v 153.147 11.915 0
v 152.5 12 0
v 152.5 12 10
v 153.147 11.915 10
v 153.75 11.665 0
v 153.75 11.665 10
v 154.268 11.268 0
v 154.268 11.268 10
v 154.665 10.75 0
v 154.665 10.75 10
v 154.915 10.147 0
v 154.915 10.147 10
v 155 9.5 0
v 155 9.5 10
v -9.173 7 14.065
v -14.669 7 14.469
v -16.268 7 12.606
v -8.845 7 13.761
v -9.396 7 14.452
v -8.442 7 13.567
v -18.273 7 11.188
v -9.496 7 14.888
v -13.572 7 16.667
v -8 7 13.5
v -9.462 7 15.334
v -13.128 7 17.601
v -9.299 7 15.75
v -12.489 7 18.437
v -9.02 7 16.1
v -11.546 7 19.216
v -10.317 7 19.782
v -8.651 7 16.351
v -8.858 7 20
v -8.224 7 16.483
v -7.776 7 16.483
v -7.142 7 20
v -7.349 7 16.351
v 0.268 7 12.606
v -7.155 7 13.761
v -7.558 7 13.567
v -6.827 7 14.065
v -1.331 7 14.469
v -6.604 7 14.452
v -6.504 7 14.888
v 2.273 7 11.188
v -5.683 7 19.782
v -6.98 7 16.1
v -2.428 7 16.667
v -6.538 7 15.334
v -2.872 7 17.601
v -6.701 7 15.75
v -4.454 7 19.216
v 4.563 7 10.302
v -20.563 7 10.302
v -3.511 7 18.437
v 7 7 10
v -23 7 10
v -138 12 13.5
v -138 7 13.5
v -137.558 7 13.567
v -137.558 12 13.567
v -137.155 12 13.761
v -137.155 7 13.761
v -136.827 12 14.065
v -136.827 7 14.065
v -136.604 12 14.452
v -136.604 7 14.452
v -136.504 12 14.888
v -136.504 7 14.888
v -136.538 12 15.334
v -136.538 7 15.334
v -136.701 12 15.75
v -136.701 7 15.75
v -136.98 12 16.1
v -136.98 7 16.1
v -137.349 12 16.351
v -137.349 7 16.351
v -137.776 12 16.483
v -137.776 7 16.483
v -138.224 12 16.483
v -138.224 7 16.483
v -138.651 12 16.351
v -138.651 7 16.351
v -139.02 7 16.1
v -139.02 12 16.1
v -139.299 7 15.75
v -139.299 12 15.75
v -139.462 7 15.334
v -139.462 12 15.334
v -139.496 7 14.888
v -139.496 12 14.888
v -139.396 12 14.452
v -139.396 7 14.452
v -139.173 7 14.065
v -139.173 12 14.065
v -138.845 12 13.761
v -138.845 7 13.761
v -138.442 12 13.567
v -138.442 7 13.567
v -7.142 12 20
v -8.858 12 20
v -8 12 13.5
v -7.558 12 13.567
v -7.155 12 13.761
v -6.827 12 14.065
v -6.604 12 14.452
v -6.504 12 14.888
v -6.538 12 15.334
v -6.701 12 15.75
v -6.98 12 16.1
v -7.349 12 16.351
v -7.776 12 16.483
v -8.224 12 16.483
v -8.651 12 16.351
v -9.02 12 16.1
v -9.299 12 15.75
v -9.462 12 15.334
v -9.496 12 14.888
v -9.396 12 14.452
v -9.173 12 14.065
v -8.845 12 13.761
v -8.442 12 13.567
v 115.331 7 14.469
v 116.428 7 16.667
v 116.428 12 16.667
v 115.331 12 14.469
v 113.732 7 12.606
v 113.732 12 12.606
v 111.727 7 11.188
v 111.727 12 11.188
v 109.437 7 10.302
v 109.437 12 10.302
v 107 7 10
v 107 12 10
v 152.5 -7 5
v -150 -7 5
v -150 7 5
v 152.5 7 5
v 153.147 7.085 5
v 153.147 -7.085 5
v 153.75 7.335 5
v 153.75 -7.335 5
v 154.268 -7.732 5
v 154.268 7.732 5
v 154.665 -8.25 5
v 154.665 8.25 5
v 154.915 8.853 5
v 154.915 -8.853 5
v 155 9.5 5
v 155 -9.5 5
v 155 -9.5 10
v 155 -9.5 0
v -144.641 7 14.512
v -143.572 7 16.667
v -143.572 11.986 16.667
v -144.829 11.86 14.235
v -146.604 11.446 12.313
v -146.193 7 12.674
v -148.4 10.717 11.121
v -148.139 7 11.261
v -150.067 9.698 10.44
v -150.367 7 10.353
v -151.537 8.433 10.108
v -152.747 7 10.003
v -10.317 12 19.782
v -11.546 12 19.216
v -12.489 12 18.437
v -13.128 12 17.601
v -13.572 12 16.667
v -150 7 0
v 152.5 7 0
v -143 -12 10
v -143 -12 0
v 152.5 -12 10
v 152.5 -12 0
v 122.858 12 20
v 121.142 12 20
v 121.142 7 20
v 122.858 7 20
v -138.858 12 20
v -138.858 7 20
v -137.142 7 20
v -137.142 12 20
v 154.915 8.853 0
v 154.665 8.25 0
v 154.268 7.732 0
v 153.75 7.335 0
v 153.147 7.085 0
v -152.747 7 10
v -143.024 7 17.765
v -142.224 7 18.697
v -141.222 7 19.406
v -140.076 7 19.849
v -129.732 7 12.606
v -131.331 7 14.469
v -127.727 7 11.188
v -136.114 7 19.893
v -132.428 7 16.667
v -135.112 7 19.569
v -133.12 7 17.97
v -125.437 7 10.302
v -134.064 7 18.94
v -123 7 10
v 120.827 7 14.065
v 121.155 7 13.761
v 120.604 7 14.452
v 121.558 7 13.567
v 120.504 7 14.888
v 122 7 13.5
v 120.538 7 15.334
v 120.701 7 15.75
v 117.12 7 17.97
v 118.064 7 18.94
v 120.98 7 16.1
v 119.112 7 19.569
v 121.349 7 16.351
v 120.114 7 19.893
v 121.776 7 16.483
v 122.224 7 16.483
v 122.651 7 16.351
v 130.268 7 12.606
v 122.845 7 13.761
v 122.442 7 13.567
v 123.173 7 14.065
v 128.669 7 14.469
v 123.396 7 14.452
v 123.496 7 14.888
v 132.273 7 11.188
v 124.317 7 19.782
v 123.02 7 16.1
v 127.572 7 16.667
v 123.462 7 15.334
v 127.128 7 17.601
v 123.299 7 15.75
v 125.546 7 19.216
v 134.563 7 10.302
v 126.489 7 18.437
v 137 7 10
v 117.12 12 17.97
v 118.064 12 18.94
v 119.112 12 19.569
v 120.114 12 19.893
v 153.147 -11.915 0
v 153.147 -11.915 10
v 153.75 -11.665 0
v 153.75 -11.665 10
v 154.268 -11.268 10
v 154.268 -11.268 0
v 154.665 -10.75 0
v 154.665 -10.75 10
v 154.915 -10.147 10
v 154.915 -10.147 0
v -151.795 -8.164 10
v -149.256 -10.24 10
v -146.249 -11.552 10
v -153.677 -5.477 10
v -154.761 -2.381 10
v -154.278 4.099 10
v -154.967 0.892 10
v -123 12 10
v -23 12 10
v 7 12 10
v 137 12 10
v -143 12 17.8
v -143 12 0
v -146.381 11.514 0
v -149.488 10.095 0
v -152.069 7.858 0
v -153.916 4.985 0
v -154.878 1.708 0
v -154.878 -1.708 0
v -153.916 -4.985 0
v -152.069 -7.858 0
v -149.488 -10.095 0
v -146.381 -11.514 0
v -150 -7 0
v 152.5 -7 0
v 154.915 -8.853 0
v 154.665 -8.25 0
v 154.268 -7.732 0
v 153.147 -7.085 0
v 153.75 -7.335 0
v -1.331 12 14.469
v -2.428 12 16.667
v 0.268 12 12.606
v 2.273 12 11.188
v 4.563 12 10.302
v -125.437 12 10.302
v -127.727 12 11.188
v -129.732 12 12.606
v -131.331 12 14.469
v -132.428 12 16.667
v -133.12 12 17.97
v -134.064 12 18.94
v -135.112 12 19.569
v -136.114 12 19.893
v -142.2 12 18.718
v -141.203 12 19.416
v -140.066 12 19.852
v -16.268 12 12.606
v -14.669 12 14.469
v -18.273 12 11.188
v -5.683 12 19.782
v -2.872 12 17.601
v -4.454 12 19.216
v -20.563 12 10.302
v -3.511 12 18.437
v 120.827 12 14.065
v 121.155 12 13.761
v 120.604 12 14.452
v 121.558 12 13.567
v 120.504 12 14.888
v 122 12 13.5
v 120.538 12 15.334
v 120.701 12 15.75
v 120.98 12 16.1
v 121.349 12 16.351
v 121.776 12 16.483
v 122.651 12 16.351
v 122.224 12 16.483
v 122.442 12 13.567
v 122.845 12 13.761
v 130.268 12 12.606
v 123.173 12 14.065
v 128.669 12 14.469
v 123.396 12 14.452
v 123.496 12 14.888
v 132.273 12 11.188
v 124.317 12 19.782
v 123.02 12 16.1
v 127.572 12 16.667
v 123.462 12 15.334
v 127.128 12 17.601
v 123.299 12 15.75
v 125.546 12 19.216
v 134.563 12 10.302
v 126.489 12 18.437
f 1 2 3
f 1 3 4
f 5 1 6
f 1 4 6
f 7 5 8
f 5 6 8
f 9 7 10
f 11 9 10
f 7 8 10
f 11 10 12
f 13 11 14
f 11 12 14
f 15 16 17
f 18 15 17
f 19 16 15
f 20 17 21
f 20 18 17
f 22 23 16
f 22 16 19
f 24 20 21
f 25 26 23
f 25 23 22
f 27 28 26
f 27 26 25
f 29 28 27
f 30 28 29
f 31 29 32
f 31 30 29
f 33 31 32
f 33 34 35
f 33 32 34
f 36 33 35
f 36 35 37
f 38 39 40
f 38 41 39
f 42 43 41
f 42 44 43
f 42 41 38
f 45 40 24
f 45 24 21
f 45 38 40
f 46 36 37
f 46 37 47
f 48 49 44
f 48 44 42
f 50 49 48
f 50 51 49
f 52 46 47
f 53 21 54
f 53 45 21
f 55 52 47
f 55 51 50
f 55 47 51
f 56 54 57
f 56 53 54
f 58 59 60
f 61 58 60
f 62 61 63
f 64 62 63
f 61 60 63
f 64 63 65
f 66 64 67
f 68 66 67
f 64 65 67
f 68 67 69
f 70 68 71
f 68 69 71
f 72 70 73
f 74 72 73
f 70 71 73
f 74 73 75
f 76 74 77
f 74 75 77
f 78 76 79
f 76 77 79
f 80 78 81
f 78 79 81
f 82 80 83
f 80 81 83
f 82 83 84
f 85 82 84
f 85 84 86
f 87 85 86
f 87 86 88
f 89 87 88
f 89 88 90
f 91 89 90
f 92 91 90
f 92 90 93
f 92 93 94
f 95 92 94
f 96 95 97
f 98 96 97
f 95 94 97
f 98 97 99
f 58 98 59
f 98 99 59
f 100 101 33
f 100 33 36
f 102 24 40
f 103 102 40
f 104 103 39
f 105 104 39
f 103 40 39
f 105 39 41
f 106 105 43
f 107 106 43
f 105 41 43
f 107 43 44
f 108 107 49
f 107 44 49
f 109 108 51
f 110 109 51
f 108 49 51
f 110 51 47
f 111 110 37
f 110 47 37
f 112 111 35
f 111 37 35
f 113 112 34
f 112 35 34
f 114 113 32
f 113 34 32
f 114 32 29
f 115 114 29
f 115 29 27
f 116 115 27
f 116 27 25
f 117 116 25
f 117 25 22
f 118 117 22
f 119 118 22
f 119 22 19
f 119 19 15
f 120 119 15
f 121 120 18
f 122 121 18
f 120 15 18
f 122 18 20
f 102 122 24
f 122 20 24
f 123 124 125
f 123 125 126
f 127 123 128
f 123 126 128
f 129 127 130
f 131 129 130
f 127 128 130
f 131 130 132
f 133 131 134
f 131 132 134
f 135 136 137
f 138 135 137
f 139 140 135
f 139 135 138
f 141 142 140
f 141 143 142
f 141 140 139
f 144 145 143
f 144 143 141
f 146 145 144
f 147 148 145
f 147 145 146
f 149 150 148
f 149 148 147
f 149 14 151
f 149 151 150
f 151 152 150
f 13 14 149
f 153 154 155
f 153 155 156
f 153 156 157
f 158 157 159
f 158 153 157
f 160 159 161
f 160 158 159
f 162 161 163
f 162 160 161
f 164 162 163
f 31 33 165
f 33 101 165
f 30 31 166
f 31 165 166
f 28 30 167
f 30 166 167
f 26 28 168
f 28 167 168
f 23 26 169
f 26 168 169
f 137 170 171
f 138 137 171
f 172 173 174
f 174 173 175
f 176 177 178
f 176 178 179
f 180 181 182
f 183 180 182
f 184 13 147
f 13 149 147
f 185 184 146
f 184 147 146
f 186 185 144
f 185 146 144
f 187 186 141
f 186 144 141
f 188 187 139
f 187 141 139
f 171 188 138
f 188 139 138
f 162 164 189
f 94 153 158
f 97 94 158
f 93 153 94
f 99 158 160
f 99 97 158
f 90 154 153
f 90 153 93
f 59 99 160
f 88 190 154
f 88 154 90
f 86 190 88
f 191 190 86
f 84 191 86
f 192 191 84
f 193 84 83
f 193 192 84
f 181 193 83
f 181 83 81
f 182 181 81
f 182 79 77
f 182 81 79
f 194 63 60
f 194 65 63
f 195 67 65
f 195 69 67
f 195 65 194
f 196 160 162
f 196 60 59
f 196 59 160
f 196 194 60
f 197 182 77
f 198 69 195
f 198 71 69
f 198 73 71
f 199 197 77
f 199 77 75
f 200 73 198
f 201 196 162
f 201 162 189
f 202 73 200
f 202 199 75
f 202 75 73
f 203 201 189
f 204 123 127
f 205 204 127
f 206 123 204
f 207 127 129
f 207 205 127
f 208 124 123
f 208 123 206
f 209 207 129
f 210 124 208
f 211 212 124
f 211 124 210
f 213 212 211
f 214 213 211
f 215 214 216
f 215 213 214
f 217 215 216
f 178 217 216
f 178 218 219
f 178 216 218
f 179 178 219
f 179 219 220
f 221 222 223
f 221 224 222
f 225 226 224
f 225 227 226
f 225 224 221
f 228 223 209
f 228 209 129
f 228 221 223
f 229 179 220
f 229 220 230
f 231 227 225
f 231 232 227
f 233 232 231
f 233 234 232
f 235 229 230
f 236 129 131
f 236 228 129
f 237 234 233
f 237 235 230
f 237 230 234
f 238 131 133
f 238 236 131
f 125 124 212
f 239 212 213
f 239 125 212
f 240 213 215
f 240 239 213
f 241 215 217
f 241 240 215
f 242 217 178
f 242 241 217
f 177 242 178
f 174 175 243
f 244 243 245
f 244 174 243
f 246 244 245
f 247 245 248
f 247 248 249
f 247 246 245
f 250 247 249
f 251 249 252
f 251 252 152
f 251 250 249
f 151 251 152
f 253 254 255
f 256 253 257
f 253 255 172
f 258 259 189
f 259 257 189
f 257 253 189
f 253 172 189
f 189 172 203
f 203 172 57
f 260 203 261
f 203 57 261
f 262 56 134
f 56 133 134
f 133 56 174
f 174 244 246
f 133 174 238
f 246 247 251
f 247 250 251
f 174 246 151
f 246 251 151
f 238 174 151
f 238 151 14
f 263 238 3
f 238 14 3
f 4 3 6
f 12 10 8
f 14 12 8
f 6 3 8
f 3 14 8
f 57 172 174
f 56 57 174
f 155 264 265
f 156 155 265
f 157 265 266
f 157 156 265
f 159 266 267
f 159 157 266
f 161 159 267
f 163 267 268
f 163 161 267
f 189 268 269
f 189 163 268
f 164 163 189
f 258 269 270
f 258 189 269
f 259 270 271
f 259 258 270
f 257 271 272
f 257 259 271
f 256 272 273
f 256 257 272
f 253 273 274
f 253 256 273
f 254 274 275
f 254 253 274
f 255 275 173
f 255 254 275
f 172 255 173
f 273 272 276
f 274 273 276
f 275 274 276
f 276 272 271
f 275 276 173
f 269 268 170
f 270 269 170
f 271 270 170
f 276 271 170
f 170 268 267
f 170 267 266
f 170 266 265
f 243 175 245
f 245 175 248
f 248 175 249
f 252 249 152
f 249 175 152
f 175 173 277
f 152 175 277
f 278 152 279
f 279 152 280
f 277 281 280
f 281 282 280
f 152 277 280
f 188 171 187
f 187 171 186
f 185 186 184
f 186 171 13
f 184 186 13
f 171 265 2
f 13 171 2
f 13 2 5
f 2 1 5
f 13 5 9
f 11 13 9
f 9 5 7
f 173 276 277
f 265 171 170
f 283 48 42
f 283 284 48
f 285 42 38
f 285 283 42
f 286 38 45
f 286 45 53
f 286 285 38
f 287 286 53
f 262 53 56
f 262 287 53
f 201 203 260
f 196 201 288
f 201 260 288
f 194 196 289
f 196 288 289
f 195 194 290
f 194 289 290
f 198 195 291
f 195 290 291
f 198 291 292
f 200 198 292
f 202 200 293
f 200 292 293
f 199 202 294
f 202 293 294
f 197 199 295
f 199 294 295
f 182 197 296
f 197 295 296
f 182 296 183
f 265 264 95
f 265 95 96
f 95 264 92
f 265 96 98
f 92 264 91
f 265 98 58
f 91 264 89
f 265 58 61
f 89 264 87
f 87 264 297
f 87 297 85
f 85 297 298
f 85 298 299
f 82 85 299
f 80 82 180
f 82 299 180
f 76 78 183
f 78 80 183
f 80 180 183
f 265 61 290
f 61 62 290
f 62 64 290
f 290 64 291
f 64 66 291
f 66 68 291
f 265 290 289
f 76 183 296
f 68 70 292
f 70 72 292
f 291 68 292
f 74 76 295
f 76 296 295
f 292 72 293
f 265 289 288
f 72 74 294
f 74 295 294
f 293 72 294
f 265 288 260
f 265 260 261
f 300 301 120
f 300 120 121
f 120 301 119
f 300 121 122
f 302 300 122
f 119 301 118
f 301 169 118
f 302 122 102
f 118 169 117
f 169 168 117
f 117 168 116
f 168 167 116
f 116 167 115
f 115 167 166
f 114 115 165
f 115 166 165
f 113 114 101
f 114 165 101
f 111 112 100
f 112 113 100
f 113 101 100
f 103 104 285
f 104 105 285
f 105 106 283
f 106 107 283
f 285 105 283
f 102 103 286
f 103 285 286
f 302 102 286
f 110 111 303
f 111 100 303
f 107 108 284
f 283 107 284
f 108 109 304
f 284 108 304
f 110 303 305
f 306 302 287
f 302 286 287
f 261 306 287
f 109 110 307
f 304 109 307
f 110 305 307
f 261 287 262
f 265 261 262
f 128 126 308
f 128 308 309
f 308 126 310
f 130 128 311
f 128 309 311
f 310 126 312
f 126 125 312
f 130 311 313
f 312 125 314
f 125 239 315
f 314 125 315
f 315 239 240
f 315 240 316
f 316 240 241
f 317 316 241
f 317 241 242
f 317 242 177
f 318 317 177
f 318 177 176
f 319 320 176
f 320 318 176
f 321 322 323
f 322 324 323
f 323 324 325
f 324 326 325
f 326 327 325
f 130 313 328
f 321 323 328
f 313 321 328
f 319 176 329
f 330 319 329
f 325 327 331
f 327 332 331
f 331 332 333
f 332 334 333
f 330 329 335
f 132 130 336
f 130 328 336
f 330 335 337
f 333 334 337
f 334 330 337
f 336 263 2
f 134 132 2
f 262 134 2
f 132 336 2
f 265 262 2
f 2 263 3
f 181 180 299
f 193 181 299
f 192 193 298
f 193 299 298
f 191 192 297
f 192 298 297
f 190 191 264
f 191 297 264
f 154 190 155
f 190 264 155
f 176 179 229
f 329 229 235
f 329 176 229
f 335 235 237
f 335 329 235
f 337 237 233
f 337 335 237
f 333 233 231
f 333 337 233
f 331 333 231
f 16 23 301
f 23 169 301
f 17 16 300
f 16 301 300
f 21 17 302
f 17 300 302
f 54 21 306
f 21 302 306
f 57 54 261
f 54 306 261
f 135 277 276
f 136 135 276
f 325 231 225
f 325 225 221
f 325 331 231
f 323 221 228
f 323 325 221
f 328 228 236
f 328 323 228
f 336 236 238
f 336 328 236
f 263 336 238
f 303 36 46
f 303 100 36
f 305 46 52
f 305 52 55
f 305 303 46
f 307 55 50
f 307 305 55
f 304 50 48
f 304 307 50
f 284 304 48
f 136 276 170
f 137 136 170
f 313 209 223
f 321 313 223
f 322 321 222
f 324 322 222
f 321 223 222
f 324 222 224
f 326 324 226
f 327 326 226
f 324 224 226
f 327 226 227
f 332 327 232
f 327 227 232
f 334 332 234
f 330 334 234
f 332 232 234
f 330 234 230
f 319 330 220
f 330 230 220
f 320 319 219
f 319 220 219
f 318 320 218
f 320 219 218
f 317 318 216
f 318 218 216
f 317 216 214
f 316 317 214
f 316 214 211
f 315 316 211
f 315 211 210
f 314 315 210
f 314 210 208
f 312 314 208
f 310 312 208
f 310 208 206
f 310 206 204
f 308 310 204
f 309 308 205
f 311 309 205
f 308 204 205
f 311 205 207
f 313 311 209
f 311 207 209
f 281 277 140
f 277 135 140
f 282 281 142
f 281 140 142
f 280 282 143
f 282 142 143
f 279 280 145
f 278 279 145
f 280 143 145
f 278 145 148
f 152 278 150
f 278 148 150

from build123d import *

# Parameters (mm, degrees)
BOSS_EXTRU_1_DEPTH = 10
BOSS_EXTRU_2_REACH = 312.393
ESQUISSE2_W        = 5
ESQUISSE2_H        = 24
CONG_1_RADIUS      = 12
CONG_1_LENGTH      = 10
BOSS_EXTRU_3_START = -19
ESQUISSE3_W        = 10
ESQUISSE3_H        = 10
ESQUISSE3_R        = 1.5
BOSS_EXTRU_3_DEPTH = 5
CONG_2_R           = 10
CONG_3_R           = 10
CONG_4_R           = 2.5
CONG_5_R           = 2.5
CONG_6_R           = 5


# Some blends are built 0.0001 mm under size
with BuildPart() as part:
    # Esquisse1 → Boss.-Extru.1 (new body)
    with BuildSketch(Plane.XY):
        Polygon((-150, 7), (-155, 7), (-155, -12), (155, -12), (155, -7), (150, -7), (-150, -7), align=None)
        Polygon((155, 12), (-155, 12), (-155, 7), (-150, 7), (150, 7), (155, 7), align=None)
    extrude(amount=BOSS_EXTRU_1_DEPTH)

    # Esquisse2 → Boss.-Extru.2 (add, up to next)
    with BuildSketch(Plane(origin=(155, 0, 0), x_dir=(0, 0, -1), z_dir=(1, 0, 0)), mode=Mode.PRIVATE) as boss_extru_2_sk1:
        with Locations((-7.5, 0)):
            Rectangle(ESQUISSE2_W, ESQUISSE2_H)
    boss_extru_2_tool1 = extrude(boss_extru_2_sk1.sketch, amount=-BOSS_EXTRU_2_REACH, mode=Mode.PRIVATE) - part.part
    add(boss_extru_2_tool1.solids().sort_by_distance((155, 0, 7.5))[0])

    # Congé1: full round fillet: the end face becomes a half cylinder, R = half its width
    cong_1_face = Plane((-155, 0, 5), x_dir=(0, 0, 1), z_dir=(-1, 0, 0))  # on the end face: x along it, z out of the body
    cong_1_slab = cong_1_face.offset(-CONG_1_RADIUS / 2) * Box(CONG_1_LENGTH, 2 * CONG_1_RADIUS, CONG_1_RADIUS, mode=Mode.PRIVATE)  # the body's end, R deep
    cong_1_round = Plane((-143, 0, 5), x_dir=(-1, 0, 0), z_dir=(0, 0, 1)) * Cylinder(CONG_1_RADIUS, CONG_1_LENGTH, mode=Mode.PRIVATE)  # its axis R under the face
    add(cong_1_slab - cong_1_round, mode=Mode.SUBTRACT)

    # Esquisse3 → Boss.-Extru.3 (add)
    # profile 1 of 3: a face of its own
    with BuildSketch(Plane.XZ.offset(12).offset(BOSS_EXTRU_3_START)):
        with Locations((-8, 15)):
            Rectangle(ESQUISSE3_W, ESQUISSE3_H)
        with Locations(Location((-8, 15, 0), (0, 0, 270))):
            Circle(ESQUISSE3_R, mode=Mode.SUBTRACT)
    # profile 2 of 3: a face of its own
    with BuildSketch(Plane.XZ.offset(12).offset(BOSS_EXTRU_3_START)):
        with Locations((-138, 15)):
            Rectangle(ESQUISSE3_W, ESQUISSE3_H)
        with Locations(Location((-138, 15, 0), (0, 0, 270))):
            Circle(ESQUISSE3_R, mode=Mode.SUBTRACT)
    # profile 3 of 3: a face of its own
    with BuildSketch(Plane.XZ.offset(12).offset(BOSS_EXTRU_3_START)):
        with Locations((122, 15)):
            Rectangle(ESQUISSE3_W, ESQUISSE3_H)
        with Locations(Location((122, 15, 0), (0, 0, 270))):
            Circle(ESQUISSE3_R, mode=Mode.SUBTRACT)
    extrude(amount=-BOSS_EXTRU_3_DEPTH)

    # Congé2
    # the kernel refuses this fillet: 10 mm, written as the material it adds along each edge
    with BuildSketch(Plane(origin=(-143, 7, 10), x_dir=(-1, 0, 0), z_dir=(0, 1, 0))) as cong_2_piece_1_section:
        with BuildLine():
            CenterArc((CONG_2_R, CONG_2_R), CONG_2_R, 180, 90)
            Line((0, CONG_2_R), (0, 0))
            Line((0, 0), (CONG_2_R, 0))
        make_face()
    cong_2_piece_1 = extrude(amount=30, mode=Mode.PRIVATE)
    cong_2_piece_1 = cong_2_piece_1 & Plane(origin=(-143, 0, 12.346007959), x_dir=(-1, 0, 0), z_dir=(0, 0, 1)) * Cylinder(12, 100, mode=Mode.PRIVATE)
    add(cong_2_piece_1)

    # Congé3
    cong_3_edges = [part.edges().sort_by_distance(p)[0] for p in [
        (127, 9.5, 10),
        (117, 9.5, 10),
        (-3, 9.5, 10),
        (-13, 9.5, 10),
        (-133, 9.5, 10),
    ]]
    fillet(cong_3_edges, radius=CONG_3_R - 0.0001)  # a hair under: the kernel refuses the full size

    # Congé4
    cong_4_edges = [part.edges().sort_by_distance(p)[0] for p in [
        (155, -12, 5),
        (155, -7, 2.5),
    ]]
    fillet(cong_4_edges, radius=CONG_4_R - 0.0001)  # a hair under: the kernel refuses the full size

    # Congé5
    cong_5_edges = [part.edges().sort_by_distance(p)[0] for p in [
        (155, 12, 5),
        (155, 7, 2.5),
    ]]
    fillet(cong_5_edges, radius=CONG_5_R - 0.0001)  # a hair under: the kernel refuses the full size

    # Congé6
    cong_6_edges = [part.edges().sort_by_distance(p)[0] for p in [
        (-143, 9.5, 20),
        (-133, 9.5, 20),
        (-13, 9.5, 20),
        (-3, 9.5, 20),
        (117, 9.5, 20),
        (127, 9.5, 20),
    ]]
    fillet(cong_6_edges, radius=CONG_6_R)


solid = part.part
